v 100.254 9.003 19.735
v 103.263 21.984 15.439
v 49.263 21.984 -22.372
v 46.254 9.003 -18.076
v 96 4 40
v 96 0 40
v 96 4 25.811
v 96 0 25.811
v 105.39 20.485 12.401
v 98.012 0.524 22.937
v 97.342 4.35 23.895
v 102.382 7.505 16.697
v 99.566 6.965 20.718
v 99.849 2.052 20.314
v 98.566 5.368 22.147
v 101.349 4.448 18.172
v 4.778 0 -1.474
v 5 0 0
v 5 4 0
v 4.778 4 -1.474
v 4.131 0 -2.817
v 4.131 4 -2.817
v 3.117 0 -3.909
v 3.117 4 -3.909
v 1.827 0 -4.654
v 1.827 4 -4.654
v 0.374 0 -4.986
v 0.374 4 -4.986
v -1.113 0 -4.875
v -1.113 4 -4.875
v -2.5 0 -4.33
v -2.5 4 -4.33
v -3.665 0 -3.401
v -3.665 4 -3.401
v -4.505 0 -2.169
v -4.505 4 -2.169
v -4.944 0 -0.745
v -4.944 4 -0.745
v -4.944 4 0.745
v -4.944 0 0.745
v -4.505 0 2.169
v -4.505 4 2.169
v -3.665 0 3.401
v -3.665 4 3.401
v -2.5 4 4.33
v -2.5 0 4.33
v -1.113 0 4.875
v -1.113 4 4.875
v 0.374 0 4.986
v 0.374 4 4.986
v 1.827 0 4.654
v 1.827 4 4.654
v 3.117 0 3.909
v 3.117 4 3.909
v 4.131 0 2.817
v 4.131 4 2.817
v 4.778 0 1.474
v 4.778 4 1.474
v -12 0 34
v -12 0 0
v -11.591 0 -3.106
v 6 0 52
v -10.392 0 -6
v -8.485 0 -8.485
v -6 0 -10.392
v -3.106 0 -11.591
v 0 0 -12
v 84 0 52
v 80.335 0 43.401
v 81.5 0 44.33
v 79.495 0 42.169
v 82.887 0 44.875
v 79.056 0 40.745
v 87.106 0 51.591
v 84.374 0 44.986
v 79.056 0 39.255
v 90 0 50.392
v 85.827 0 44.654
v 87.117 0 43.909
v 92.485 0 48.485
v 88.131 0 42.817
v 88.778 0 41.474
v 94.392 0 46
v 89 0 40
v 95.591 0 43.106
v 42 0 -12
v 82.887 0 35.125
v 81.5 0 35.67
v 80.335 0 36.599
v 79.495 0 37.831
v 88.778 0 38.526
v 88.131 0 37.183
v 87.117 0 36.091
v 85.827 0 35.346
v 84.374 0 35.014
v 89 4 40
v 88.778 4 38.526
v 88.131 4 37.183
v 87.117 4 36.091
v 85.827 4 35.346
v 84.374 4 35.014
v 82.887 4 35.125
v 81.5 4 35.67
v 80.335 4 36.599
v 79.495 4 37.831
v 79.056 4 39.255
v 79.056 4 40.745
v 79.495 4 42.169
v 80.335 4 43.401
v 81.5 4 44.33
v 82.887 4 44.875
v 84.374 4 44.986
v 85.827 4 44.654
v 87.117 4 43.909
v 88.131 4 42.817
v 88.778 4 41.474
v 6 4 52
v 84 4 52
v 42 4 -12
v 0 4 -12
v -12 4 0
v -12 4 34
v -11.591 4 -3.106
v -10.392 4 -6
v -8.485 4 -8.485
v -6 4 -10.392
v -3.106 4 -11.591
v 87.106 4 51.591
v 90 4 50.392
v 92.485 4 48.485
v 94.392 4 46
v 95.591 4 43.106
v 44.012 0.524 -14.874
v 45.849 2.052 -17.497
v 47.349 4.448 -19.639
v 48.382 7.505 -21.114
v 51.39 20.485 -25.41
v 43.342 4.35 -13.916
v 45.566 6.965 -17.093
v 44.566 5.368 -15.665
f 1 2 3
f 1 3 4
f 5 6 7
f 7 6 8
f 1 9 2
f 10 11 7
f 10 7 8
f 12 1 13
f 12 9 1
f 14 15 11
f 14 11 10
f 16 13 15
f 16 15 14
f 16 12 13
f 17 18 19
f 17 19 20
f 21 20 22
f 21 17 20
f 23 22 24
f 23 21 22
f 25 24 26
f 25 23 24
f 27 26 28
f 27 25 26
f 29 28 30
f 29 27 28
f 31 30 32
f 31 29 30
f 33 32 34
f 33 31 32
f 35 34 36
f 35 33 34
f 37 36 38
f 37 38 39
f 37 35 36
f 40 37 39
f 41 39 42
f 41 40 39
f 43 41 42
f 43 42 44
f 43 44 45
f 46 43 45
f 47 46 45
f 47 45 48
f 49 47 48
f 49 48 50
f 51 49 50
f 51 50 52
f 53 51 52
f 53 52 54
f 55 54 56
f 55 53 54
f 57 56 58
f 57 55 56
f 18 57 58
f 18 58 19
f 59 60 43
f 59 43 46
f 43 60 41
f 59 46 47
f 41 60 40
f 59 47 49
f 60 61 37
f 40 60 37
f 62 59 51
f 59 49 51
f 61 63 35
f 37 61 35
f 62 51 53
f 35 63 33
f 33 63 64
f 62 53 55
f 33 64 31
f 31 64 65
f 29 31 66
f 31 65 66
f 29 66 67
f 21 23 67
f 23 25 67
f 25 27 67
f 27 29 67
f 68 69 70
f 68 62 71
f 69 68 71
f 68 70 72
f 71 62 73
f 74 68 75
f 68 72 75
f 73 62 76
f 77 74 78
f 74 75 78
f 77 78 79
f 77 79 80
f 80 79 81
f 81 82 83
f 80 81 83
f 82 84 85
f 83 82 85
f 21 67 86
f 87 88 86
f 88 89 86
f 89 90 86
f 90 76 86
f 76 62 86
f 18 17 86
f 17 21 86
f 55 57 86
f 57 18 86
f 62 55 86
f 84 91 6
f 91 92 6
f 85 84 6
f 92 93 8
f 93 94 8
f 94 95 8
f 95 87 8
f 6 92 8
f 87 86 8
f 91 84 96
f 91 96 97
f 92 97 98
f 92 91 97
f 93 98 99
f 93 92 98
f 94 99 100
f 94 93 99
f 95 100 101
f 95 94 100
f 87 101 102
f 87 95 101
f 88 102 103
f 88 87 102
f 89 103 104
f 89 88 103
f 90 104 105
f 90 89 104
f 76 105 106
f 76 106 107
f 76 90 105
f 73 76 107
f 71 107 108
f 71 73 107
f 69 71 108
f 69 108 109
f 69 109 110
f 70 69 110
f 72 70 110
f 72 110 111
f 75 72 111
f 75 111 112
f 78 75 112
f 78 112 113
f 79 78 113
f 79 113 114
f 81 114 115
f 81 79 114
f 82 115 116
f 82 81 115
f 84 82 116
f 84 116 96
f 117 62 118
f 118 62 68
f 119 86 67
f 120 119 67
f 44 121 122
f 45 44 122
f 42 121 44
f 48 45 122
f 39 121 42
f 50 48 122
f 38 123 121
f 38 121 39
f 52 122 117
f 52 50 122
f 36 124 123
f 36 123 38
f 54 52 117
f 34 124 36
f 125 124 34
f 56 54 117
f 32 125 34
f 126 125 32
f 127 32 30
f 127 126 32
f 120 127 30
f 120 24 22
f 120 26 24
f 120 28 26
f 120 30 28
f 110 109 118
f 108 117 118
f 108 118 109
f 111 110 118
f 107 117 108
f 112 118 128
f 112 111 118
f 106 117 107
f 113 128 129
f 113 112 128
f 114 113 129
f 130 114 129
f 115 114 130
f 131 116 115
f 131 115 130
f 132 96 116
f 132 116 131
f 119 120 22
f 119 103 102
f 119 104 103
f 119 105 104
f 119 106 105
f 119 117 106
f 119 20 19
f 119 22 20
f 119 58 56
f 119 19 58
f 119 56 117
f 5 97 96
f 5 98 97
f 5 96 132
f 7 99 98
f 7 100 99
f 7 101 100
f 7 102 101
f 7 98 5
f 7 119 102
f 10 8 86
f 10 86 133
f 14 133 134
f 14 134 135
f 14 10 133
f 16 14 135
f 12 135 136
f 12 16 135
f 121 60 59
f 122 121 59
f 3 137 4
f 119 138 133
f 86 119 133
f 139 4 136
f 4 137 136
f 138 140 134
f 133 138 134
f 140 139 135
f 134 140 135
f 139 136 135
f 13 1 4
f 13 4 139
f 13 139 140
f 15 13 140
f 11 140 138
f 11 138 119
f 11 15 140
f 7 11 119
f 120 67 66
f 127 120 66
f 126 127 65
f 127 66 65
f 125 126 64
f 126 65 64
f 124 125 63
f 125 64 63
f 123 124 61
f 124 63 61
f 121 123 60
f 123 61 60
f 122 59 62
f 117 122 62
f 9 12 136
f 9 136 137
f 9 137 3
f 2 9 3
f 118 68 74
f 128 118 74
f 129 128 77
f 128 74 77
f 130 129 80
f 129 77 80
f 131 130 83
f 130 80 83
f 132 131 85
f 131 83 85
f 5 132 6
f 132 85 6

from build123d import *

# Parameters (mm, degrees)
SKETCH1_R           = 5
BOSS_EXTRUDE1_DEPTH = 4
BOSS_EXTRUDE2_DEPTH = 65.921828


with BuildPart() as part:
    # Sketch1 → Boss-Extrude1 (new body)
    with BuildSketch(Plane(origin=(0, 0, 0), x_dir=(1, 0, 0), z_dir=(0, 1, 0))):
        with BuildLine():
            Line((-12, 0), (-12, -34))
            Line((-12, -34), (6, -52))
            Line((6, -52), (84, -52))
            ThreePointArc((84, -52), (92.485281374, -48.485281374), (96, -40))
            Line((96, -40), (96, -25.811207063))
            Line((96, -25.811207063), (42, 12))
            Line((42, 12), (0, 12))
            ThreePointArc((0, 12), (-8.485281374, 8.485281374), (-12, 0))
        make_face()
        Circle(SKETCH1_R, mode=Mode.SUBTRACT)
        with Locations((84, -40)):
            Circle(SKETCH1_R, mode=Mode.SUBTRACT)
    extrude(amount=BOSS_EXTRUDE1_DEPTH)

    # Sketch3 → Boss-Extrude2 (add)
    with BuildSketch(Plane(origin=(76.544267285, 0, 53.59687296), x_dir=(0, -1, 0), z_dir=(0.819152044, 0, 0.573576436))):
        with BuildLine():
            Line((-20.485294843, 50.290733421), (-21.983721217, 46.581998003))
            Line((-21.983721217, 46.581998003), (-9.003147253, 41.337505695))
            ThreePointArc((-9.003147253, 41.337505695), (-5.36769942, 38.393578086), (-4, 33.920034858))
            Line((-4, 33.920034858), (0, 33.920034858))
            ThreePointArc((0, 33.920034858), (-2.051549129, 40.6303497), (-7.504720879, 45.046241113))
            Line((-7.504720879, 45.046241113), (-20.485294843, 50.290733421))
        make_face()
    extrude(amount=-BOSS_EXTRUDE2_DEPTH)


solid = part.part
